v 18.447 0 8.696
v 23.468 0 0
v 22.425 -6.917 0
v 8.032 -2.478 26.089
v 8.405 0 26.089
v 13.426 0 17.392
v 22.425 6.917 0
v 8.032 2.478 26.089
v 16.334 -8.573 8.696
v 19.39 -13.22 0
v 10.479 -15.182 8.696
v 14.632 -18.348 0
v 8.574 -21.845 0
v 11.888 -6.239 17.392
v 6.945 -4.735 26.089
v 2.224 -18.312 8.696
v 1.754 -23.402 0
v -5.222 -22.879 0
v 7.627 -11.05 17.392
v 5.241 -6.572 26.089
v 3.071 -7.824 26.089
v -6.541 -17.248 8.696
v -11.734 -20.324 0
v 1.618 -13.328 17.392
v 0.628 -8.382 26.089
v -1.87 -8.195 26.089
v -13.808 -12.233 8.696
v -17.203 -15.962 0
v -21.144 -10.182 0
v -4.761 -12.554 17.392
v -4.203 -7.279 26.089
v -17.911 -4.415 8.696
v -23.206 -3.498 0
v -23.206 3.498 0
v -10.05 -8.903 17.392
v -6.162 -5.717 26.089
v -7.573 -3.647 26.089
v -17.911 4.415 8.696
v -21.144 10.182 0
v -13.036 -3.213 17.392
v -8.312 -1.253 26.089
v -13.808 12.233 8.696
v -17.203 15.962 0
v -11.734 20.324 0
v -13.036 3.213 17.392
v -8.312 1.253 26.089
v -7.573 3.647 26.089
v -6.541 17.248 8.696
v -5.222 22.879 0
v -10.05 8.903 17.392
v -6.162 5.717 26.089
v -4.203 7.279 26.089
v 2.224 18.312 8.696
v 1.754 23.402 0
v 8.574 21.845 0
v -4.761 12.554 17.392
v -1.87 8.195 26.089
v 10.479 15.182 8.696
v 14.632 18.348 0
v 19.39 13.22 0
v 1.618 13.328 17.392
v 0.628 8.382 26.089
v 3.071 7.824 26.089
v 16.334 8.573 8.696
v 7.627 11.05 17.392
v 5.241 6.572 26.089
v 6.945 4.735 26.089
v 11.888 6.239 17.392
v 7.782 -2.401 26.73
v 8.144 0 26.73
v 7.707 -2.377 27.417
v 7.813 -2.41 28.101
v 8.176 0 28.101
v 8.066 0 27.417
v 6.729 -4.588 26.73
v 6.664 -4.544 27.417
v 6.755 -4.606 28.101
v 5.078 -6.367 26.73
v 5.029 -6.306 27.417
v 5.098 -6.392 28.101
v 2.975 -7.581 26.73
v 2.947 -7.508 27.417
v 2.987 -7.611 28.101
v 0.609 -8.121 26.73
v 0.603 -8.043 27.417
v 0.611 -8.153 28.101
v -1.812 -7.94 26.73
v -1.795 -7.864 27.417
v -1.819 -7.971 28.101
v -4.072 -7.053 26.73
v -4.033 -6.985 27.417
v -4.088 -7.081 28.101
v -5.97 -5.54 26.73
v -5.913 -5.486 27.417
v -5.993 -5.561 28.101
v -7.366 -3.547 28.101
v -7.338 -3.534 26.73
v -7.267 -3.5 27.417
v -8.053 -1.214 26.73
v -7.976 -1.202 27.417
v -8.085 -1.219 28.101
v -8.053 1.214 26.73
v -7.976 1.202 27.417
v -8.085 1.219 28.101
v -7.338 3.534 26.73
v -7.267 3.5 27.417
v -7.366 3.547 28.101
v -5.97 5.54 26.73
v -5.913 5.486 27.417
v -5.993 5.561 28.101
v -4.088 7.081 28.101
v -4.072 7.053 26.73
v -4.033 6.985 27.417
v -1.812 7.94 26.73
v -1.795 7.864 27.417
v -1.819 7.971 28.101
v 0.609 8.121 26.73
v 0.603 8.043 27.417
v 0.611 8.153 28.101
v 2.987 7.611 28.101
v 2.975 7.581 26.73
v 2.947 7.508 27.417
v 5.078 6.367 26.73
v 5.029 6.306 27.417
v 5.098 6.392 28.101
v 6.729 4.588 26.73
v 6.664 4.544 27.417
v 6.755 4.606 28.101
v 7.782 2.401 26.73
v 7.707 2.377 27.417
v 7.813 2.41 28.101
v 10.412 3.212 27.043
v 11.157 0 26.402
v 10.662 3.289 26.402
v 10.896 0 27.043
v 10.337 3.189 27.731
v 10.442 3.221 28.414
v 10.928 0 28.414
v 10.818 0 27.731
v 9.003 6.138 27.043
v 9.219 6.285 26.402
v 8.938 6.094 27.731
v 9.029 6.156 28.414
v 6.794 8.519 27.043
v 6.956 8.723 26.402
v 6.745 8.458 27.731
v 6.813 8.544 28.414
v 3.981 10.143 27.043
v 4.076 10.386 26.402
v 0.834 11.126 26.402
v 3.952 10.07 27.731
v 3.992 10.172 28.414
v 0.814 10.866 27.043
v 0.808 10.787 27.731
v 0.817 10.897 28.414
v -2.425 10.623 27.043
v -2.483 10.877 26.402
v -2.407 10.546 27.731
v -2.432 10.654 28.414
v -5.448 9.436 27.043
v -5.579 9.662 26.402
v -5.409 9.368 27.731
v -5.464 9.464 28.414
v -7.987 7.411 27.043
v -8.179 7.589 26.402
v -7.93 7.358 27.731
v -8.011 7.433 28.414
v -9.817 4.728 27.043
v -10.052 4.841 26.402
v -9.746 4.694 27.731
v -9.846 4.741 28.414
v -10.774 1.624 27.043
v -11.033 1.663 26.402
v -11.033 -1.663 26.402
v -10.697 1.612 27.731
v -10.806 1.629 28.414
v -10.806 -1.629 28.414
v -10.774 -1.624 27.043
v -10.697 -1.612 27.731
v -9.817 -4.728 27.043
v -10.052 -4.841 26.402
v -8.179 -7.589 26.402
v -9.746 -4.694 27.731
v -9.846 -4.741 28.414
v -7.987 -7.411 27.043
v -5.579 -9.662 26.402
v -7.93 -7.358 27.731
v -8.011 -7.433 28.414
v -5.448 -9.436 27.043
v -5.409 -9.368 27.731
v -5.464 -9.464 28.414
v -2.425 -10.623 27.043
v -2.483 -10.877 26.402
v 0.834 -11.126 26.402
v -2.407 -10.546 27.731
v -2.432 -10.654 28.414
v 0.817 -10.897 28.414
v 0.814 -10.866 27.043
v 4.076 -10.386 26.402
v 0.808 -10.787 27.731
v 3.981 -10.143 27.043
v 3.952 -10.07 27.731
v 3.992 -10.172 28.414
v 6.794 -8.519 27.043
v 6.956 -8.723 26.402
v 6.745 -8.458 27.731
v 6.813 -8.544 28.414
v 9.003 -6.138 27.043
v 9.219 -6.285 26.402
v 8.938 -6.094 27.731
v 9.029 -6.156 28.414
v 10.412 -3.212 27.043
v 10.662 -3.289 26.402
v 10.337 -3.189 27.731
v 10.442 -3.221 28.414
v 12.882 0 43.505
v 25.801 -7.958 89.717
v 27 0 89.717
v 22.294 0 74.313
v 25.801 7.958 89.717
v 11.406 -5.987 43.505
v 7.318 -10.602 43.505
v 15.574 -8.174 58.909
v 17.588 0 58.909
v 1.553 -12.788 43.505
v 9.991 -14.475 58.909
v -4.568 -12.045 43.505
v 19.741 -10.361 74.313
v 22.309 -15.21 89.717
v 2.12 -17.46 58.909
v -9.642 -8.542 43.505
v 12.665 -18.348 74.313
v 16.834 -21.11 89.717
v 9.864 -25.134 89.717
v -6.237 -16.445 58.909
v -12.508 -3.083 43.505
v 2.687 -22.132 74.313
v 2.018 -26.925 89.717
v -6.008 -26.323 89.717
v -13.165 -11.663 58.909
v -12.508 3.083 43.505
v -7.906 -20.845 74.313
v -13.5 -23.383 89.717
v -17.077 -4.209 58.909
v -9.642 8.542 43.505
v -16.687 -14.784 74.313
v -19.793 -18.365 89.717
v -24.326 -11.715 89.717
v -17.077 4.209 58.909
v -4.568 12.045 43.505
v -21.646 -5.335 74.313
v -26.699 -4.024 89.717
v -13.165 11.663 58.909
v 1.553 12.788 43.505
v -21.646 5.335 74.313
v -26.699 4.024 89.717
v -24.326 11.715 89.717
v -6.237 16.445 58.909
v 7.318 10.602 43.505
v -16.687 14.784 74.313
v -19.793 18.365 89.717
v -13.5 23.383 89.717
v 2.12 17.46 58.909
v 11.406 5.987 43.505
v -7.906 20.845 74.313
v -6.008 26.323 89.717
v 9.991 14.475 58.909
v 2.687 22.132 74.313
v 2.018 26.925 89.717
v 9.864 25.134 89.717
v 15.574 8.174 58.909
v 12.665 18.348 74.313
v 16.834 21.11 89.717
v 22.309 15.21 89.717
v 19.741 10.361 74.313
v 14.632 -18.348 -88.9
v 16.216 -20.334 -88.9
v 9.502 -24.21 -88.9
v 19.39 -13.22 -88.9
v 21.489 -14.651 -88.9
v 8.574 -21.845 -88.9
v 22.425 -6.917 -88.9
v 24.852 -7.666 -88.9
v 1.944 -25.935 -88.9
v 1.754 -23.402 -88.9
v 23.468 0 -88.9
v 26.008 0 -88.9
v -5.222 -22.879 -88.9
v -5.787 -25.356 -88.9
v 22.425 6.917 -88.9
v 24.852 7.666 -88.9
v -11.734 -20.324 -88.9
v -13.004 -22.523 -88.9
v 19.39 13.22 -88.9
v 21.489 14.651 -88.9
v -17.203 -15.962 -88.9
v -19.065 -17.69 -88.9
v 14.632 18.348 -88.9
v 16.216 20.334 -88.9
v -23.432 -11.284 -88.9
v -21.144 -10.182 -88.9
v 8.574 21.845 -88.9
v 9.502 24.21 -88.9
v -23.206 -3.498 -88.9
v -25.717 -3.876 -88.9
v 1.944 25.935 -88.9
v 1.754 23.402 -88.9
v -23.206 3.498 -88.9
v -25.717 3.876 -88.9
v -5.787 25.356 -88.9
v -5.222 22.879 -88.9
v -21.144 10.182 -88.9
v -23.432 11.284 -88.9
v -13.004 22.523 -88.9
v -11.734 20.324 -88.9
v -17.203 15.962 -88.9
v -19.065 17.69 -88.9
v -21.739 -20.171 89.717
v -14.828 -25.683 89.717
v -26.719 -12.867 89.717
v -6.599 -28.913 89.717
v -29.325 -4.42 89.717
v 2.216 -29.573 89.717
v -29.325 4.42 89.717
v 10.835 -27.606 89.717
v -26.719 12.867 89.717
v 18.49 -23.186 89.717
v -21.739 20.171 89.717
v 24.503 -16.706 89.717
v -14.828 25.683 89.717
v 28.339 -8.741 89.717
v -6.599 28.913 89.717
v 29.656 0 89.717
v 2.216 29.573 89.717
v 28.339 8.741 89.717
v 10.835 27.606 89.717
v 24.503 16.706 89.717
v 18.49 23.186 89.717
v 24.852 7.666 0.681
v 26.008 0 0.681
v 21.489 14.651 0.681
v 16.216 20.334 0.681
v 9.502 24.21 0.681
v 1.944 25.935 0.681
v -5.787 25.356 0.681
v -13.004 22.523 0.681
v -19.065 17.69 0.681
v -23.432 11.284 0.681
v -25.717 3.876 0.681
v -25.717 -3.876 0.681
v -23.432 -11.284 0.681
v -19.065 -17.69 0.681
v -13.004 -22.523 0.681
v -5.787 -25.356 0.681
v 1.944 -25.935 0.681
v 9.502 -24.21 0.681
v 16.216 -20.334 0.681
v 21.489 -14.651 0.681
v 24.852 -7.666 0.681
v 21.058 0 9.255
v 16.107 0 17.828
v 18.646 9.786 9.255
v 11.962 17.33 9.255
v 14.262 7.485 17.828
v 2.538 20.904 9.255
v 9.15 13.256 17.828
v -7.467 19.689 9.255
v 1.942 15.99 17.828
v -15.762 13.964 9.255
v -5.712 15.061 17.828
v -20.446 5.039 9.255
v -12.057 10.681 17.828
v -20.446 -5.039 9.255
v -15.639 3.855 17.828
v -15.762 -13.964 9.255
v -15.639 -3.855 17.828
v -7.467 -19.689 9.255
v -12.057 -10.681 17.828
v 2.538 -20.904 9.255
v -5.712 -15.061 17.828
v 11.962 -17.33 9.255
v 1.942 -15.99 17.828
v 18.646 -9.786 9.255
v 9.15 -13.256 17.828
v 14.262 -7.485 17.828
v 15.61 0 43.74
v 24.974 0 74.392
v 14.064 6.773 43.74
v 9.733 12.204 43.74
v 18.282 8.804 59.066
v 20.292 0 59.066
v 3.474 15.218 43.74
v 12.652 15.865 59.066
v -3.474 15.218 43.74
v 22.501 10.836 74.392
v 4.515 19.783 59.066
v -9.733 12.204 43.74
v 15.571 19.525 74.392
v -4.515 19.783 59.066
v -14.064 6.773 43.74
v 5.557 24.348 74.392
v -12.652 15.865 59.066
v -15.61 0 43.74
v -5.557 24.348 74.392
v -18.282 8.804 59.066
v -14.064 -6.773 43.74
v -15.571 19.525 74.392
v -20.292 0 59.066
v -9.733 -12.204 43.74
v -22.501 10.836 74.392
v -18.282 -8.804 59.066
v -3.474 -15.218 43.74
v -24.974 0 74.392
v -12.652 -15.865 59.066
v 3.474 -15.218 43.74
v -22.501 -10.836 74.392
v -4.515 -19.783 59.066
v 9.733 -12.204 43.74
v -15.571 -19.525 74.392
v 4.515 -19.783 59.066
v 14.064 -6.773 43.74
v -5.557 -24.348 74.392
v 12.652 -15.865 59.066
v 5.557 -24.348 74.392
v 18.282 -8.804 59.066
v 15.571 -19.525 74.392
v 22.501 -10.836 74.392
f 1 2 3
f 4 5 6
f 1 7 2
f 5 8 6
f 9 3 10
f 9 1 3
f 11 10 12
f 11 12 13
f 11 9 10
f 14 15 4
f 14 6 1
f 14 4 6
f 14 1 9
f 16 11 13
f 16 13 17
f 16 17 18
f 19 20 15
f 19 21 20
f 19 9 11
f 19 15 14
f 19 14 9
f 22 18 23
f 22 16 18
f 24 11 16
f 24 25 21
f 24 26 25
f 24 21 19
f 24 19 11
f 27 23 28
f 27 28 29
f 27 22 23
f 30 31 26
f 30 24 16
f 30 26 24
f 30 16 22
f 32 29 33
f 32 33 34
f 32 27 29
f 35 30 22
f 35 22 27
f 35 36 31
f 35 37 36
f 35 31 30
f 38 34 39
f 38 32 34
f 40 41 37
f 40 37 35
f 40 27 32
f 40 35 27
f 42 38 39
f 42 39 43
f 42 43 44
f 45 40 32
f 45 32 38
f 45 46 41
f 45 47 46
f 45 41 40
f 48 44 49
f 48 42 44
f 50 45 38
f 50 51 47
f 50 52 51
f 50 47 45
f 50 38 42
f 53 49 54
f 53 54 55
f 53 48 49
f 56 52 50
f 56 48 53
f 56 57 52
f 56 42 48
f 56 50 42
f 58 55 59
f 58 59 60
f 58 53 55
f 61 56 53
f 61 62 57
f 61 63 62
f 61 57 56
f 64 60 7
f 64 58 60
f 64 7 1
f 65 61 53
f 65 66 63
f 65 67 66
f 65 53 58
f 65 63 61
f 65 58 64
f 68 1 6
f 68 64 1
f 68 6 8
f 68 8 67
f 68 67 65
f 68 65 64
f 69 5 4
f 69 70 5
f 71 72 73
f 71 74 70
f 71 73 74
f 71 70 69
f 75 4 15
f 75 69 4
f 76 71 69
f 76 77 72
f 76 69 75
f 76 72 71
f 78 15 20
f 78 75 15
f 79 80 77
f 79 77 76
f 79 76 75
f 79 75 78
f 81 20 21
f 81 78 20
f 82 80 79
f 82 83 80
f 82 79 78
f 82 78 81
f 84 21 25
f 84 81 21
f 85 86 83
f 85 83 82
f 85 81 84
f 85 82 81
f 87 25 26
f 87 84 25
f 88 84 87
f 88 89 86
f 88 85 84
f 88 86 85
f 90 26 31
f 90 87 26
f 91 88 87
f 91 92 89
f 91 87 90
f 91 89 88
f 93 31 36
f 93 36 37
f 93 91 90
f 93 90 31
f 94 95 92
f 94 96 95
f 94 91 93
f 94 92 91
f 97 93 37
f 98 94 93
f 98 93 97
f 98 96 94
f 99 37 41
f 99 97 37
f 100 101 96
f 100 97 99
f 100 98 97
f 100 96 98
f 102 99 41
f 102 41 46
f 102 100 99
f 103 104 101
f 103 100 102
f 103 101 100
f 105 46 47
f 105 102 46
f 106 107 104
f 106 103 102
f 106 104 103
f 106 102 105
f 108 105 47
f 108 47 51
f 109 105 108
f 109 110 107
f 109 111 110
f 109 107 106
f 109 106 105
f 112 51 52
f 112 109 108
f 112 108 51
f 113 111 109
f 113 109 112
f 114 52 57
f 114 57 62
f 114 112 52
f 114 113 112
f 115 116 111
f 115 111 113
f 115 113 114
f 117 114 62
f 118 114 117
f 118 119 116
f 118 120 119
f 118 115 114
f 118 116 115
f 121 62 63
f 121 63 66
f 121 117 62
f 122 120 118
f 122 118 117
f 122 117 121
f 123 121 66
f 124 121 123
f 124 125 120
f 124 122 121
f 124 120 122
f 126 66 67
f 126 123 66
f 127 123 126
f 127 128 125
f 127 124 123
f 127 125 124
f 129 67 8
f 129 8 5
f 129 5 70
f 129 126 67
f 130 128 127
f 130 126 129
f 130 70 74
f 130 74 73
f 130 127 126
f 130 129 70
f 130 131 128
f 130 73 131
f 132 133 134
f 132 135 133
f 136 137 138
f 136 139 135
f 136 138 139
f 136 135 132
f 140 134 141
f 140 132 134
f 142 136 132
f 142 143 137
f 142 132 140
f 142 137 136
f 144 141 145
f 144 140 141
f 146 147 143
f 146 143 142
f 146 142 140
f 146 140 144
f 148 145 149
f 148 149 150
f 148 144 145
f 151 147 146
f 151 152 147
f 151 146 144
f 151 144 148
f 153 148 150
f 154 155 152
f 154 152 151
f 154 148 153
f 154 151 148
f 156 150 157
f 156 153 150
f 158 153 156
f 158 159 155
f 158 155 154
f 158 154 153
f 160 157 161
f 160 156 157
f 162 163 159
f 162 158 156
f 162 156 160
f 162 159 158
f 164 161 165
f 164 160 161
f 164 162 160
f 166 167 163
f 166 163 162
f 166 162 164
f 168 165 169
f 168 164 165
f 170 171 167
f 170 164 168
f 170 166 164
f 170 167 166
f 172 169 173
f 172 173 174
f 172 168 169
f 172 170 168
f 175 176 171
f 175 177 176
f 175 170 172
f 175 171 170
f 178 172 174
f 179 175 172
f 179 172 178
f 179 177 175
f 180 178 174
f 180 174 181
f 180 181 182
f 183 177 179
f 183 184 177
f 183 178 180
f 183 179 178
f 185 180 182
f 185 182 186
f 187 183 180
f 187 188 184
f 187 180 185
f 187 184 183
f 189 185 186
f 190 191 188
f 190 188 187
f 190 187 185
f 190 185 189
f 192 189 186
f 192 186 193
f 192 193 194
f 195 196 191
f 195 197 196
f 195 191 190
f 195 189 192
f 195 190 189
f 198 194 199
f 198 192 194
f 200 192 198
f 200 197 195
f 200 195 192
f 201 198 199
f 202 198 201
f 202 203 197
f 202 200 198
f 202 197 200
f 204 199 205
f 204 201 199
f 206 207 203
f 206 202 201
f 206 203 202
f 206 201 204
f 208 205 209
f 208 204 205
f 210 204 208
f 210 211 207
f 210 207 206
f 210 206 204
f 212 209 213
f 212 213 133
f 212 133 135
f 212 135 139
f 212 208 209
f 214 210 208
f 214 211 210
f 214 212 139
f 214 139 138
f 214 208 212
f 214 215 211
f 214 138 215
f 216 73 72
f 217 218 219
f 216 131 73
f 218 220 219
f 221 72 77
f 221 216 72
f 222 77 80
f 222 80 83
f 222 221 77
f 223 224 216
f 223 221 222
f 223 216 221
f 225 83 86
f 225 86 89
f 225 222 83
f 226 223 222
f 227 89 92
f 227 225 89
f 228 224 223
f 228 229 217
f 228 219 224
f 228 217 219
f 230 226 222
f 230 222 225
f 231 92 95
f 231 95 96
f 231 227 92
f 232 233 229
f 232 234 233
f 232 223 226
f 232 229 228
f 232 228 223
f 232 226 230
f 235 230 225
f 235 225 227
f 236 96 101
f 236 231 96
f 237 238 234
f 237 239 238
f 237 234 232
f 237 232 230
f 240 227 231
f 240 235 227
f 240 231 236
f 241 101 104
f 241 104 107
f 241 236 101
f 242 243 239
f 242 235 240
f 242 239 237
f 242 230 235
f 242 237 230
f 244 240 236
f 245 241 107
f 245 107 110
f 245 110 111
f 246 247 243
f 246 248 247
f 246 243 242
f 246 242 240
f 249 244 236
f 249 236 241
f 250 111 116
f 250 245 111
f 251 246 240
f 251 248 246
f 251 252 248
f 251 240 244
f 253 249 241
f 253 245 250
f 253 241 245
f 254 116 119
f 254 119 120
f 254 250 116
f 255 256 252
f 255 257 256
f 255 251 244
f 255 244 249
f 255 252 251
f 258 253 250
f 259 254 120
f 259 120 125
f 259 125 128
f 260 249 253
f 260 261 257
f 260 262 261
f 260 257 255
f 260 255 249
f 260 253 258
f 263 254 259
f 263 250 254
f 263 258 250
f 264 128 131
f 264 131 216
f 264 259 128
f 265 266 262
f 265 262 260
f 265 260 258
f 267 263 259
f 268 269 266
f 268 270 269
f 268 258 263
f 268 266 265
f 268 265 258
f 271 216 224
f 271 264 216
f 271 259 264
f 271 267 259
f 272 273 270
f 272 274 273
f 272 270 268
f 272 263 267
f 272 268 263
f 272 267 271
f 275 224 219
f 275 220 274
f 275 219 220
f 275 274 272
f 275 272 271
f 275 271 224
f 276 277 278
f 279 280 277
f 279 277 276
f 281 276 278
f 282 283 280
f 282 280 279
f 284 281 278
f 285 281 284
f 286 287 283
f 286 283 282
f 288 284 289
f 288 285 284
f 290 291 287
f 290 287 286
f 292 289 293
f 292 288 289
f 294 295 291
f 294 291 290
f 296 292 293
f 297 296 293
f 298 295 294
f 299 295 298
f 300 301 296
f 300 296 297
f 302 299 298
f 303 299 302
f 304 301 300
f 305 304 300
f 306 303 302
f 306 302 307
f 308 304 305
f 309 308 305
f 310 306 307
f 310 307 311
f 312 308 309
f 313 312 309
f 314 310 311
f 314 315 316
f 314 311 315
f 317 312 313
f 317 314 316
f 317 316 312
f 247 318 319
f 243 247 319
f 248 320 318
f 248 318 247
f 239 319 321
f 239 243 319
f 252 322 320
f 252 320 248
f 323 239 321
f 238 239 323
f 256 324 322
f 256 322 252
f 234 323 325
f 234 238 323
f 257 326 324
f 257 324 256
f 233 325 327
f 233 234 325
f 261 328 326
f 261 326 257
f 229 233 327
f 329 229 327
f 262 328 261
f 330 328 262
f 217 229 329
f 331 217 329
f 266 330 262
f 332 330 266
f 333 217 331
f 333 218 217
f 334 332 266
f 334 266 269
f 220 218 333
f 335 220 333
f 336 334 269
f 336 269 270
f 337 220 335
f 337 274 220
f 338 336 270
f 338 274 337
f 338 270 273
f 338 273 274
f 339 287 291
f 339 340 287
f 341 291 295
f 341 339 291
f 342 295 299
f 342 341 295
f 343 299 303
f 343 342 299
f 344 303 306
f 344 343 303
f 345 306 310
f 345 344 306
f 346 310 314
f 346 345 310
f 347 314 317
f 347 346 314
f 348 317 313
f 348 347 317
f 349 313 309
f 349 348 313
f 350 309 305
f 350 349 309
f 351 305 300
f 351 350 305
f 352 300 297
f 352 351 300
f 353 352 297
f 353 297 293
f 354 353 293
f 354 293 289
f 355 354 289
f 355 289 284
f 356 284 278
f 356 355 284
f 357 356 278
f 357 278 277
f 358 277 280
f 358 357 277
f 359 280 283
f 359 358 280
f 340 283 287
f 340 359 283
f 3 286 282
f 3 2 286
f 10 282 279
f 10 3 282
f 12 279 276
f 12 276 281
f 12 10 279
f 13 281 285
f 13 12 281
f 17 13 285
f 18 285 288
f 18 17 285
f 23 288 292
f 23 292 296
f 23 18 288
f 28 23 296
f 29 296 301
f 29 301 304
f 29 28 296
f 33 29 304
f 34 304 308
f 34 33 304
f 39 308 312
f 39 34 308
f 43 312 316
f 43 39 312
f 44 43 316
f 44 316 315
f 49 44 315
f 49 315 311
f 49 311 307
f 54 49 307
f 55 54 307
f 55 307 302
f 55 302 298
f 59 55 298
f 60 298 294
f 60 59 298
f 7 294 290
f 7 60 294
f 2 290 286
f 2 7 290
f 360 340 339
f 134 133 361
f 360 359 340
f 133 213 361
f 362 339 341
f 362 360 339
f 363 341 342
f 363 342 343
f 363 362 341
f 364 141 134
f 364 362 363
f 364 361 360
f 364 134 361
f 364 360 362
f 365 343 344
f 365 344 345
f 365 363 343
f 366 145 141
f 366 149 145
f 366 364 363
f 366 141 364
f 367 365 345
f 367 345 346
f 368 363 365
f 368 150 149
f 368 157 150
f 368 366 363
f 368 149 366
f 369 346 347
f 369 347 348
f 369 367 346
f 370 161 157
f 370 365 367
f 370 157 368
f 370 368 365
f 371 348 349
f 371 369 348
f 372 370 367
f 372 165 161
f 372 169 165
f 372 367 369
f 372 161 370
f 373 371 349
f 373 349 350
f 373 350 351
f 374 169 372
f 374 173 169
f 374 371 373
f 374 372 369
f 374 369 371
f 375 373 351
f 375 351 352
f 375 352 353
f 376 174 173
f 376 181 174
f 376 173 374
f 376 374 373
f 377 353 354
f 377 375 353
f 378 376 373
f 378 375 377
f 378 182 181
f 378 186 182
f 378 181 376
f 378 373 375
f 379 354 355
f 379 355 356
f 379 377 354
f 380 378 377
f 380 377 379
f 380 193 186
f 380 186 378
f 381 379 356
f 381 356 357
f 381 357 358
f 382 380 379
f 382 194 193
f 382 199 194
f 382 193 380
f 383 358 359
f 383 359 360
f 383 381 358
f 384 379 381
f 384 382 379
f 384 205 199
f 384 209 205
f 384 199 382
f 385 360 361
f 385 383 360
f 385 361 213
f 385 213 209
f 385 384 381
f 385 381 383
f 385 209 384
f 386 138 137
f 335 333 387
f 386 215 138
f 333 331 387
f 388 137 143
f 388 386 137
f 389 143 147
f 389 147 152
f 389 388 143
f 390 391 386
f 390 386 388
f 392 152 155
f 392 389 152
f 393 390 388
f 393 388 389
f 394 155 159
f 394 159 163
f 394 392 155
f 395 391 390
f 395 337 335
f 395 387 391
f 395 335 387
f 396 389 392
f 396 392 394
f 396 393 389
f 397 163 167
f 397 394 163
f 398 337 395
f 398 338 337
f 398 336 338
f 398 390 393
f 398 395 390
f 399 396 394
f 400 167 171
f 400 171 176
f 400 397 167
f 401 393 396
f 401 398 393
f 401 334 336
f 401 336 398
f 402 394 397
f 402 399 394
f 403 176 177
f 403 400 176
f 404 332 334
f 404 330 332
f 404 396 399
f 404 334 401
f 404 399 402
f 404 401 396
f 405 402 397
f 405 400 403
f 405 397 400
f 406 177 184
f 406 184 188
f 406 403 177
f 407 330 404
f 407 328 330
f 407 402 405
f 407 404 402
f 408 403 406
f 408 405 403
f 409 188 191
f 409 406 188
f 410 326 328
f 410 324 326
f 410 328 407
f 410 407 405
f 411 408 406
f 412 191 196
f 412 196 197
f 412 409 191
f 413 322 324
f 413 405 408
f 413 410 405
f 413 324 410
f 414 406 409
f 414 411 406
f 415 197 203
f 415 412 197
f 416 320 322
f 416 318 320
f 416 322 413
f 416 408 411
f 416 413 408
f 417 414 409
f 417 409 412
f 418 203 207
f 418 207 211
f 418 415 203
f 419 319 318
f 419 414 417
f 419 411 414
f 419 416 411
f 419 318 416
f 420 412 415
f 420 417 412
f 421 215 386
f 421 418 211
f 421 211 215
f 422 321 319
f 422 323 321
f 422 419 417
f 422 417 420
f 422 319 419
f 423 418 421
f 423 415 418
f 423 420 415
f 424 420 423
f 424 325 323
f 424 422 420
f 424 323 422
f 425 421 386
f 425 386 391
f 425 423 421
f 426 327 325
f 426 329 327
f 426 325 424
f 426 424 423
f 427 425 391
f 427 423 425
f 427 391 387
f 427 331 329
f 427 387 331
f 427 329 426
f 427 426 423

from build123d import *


# Read off the part's stored shape, not the designer's step: Revolve4
with BuildPart() as part:
    # Sketch2 → Revolve1 (revolve)
    with BuildSketch(Plane(origin=(0, 0, 0), x_dir=(1, 0, 0), z_dir=(0, 1, 0)), mode=Mode.PRIVATE) as revolve1_sk:
        with BuildLine():
            Line((0, 88.9), (-23.467681094, 88.9))
            Line((-23.467681094, 88.9), (-23.467681094, 0))
            Line((-23.467681094, 0), (-8.405449734, -26.088549992))
            ThreePointArc((-8.405449734, -26.088549992), (-8.081511216, -27.07075529), (-8.175988072, -28.10067642))
            Line((-8.175988072, -28.10067642), (-27.000254561, -89.717228424))
            Line((-27.000254561, -89.717228424), (0, -89.717228424))
            Line((0, -89.717228424), (0, 88.9))
        make_face()
    revolve(revolve1_sk.sketch.rotate(Axis((0, 0, 0), (0, 0, -1)), 180), axis=Axis((0, 0, 0), (0, 0, -1)))

    # Revolve4 outline → Revolve4 (revolve)
    with BuildSketch(Plane.XZ):
        with BuildLine():
            Line((23.467681094, -88.9), (26.007681094, -88.9))
            Line((26.007681094, -88.9), (26.007681094, 0.680590949))
            Line((26.007681094, 0.680590949), (11.157211277, 26.402359187))
            ThreePointArc((11.157211277, 26.402359187), (10.83327276, 27.384564486), (10.927749616, 28.414485616))
            Line((10.927749616, 28.414485616), (29.656145308, 89.717228424))
            Line((29.656145308, 89.717228424), (27.000254561, 89.717228424))
            Line((27.000254561, 89.717228424), (8.175988072, 28.10067642))
            ThreePointArc((8.175988072, 28.10067642), (8.081511216, 27.07075529), (8.405449734, 26.088549992))
            Line((8.405449734, 26.088549992), (23.467681094, 0))
            Line((23.467681094, 0), (23.467681094, -88.9))
        make_face()
    revolve(axis=Axis((0, 0, 0), (0, 0, 1)))

    # Sketch6 → Cut-Revolve2 (revolve, cut)
    with BuildSketch(Plane(origin=(0, 0, 0), x_dir=(1, 0, 0), z_dir=(0, 1, 0)), mode=Mode.PRIVATE) as cut_revolve2_sk:
        with BuildLine():
            Line((0, 88.9), (-23.467681094, 88.9))
            Line((-23.467681094, 88.9), (-23.467681094, 0))
            Line((-23.467681094, 0), (-8.405449734, -26.088549992))
            ThreePointArc((-8.405449734, -26.088549992), (-8.081511216, -27.07075529), (-8.175988072, -28.10067642))
            Line((-8.175988072, -28.10067642), (-27.000254561, -89.717228424))
            Line((-27.000254561, -89.717228424), (0, -89.717228424))
            Line((0, -89.717228424), (0, 88.9))
        make_face()
    revolve(cut_revolve2_sk.sketch.rotate(Axis((0, 0, 98.648089845), (0, 0, -1)), 180), axis=Axis((0, 0, 98.648089845), (0, 0, -1)), mode=Mode.SUBTRACT)


solid = part.part
